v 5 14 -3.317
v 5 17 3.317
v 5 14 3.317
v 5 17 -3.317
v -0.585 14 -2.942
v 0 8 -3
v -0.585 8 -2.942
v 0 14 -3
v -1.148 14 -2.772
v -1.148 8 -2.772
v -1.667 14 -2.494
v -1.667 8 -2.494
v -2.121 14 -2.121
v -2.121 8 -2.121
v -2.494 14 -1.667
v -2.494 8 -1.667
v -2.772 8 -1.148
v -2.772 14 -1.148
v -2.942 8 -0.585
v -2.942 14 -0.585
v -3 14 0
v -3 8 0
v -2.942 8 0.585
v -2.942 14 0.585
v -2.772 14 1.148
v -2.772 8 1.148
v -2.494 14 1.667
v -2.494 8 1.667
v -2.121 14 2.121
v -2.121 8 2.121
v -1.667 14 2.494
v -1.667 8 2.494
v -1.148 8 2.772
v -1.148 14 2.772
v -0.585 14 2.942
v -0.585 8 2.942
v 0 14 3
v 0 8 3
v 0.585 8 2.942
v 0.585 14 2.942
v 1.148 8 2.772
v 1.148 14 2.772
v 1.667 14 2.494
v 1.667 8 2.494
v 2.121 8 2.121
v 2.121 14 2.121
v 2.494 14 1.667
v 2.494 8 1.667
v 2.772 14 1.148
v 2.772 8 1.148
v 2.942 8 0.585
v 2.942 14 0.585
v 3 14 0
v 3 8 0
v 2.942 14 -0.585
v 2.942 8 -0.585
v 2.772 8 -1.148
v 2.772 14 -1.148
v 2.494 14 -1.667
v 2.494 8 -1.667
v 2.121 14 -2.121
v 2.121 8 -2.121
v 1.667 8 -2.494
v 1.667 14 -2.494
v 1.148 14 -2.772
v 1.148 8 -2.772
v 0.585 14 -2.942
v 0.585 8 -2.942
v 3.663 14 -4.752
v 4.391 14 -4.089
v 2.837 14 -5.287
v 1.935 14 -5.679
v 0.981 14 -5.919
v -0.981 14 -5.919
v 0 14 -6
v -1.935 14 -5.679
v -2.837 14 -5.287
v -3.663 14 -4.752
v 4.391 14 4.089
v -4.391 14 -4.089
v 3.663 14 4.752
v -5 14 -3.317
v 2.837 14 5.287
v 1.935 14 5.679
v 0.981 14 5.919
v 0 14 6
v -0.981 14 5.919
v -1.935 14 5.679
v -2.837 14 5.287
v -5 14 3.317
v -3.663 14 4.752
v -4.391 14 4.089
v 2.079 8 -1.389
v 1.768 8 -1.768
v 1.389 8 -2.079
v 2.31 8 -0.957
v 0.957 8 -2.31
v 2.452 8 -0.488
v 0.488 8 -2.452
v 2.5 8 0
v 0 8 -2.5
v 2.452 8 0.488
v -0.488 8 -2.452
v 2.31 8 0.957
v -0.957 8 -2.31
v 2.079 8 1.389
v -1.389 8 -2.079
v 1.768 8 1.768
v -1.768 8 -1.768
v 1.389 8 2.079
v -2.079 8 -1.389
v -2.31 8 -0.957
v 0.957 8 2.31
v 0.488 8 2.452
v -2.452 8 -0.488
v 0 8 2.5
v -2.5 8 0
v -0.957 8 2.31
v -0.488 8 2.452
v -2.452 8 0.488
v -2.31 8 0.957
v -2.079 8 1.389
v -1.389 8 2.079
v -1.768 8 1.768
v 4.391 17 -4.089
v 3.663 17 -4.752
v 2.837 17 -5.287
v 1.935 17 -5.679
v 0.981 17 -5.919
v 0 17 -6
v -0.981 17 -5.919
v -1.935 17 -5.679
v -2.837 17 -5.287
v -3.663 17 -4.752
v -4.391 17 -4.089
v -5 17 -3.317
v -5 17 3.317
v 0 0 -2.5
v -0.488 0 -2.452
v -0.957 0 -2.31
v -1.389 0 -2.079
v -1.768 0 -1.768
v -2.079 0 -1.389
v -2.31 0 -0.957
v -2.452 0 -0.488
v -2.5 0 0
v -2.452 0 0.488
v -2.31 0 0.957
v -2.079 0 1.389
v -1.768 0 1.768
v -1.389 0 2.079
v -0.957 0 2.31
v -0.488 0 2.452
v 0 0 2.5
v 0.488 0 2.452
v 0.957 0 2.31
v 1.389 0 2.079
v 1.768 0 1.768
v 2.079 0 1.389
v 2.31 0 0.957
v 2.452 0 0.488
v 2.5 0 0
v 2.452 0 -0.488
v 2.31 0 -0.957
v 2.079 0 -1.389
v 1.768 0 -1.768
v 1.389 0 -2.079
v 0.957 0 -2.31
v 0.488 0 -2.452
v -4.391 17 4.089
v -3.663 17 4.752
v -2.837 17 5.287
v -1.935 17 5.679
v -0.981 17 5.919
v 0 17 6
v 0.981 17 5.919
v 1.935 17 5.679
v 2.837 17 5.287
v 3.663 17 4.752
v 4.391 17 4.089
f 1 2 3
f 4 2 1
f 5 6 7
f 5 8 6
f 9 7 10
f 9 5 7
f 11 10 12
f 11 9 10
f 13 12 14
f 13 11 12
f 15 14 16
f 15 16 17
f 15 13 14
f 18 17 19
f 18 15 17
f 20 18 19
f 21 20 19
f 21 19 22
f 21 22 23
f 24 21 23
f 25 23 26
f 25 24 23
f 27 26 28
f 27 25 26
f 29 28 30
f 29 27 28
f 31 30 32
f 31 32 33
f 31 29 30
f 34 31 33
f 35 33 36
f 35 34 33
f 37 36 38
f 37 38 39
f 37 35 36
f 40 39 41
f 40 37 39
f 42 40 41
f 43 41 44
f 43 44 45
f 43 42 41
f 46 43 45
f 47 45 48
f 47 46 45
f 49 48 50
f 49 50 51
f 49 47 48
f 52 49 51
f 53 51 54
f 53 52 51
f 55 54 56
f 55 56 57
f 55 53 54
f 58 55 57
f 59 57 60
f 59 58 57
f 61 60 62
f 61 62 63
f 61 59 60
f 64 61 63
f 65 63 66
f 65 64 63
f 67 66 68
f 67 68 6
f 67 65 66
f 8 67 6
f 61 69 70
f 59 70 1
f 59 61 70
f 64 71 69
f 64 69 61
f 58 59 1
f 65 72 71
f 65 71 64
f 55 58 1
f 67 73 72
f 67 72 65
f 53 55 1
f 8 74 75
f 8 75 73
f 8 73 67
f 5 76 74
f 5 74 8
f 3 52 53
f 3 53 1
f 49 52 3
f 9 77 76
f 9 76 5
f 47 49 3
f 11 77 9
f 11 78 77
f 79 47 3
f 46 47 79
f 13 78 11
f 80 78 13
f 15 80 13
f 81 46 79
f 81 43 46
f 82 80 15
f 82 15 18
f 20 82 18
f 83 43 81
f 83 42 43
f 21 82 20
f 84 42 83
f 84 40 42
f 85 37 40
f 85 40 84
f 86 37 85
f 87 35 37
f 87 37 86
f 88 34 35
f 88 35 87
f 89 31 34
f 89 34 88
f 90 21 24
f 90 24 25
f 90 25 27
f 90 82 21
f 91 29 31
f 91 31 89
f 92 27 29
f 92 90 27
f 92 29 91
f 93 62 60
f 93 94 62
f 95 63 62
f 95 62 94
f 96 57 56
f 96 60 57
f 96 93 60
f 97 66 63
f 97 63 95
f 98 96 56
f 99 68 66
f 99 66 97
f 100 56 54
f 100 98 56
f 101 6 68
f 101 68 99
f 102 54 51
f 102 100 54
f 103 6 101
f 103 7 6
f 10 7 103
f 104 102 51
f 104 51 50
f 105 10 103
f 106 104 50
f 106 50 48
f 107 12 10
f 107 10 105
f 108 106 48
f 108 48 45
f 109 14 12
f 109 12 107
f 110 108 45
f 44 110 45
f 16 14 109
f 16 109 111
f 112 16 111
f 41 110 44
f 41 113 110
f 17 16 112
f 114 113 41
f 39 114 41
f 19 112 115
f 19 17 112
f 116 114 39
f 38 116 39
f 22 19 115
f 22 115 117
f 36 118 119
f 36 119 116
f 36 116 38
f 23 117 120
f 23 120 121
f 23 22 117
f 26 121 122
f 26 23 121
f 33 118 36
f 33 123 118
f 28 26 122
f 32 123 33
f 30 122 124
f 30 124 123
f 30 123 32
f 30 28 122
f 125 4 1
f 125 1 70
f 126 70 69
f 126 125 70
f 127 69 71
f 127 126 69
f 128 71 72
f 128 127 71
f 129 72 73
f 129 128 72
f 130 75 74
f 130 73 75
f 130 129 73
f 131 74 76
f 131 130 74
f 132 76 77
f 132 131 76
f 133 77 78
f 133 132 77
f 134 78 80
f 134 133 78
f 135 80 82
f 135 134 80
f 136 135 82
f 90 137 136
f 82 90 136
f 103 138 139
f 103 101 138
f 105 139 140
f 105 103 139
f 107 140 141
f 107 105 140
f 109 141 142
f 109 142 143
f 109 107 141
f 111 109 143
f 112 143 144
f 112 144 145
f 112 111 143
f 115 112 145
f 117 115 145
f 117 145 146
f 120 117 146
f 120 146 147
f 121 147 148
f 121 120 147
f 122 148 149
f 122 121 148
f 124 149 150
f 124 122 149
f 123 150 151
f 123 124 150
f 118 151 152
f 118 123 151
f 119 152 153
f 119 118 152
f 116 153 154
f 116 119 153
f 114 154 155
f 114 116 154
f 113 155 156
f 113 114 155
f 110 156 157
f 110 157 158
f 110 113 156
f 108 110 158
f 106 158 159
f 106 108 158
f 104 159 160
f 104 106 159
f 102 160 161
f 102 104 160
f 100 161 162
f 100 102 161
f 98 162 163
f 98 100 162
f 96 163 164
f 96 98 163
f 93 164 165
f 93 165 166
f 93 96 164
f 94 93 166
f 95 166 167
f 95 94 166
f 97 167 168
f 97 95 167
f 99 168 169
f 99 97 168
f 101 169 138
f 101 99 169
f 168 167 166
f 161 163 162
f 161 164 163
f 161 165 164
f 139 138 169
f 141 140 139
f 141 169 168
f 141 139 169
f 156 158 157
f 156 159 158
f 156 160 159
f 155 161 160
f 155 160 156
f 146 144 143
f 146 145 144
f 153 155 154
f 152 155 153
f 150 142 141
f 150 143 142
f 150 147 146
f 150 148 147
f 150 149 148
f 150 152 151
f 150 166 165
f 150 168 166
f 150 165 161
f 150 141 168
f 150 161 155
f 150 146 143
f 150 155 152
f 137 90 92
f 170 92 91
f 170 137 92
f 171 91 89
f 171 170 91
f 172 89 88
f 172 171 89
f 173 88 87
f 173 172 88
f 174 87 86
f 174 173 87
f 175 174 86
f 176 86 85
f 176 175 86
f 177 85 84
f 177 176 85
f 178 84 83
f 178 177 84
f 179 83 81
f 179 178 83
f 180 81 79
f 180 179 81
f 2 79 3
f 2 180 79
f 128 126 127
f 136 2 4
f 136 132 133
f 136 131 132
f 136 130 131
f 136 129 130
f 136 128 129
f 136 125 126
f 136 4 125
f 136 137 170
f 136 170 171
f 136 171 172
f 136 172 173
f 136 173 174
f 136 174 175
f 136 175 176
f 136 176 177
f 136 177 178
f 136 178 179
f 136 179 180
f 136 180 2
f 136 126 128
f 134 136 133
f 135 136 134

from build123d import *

# Parameters (mm, degrees)
SKETCH_2_W          = 2
SKETCH_2_H          = 8
CUT_EXTRUDE_1_DEPTH = 10


with BuildPart() as part:
    # 草图1 → 旋转1 (revolve)
    with BuildSketch(Plane(origin=(0, 0, 0), x_dir=(0, 0, -1), z_dir=(1, 0, 0))):
        Polygon((0, 0), (2.5, 0), (2.5, 8), (3, 8), (3, 14), (6, 14), (6, 17), (0, 17), align=None)
    revolve(axis=Axis((0, 0, 0), (0, 1, 0)))

    # 草图2 → 切除-拉伸1 (cut)
    with BuildSketch(Plane(origin=(0, 17, 0), x_dir=(1, 0, 0), z_dir=(0, 1, 0))):
        with Locations((-6, 0)):
            Rectangle(SKETCH_2_W, SKETCH_2_H)
        with Locations((6, 0)):
            Rectangle(SKETCH_2_W, SKETCH_2_H)
    extrude(amount=-CUT_EXTRUDE_1_DEPTH, mode=Mode.SUBTRACT)


solid = part.part
